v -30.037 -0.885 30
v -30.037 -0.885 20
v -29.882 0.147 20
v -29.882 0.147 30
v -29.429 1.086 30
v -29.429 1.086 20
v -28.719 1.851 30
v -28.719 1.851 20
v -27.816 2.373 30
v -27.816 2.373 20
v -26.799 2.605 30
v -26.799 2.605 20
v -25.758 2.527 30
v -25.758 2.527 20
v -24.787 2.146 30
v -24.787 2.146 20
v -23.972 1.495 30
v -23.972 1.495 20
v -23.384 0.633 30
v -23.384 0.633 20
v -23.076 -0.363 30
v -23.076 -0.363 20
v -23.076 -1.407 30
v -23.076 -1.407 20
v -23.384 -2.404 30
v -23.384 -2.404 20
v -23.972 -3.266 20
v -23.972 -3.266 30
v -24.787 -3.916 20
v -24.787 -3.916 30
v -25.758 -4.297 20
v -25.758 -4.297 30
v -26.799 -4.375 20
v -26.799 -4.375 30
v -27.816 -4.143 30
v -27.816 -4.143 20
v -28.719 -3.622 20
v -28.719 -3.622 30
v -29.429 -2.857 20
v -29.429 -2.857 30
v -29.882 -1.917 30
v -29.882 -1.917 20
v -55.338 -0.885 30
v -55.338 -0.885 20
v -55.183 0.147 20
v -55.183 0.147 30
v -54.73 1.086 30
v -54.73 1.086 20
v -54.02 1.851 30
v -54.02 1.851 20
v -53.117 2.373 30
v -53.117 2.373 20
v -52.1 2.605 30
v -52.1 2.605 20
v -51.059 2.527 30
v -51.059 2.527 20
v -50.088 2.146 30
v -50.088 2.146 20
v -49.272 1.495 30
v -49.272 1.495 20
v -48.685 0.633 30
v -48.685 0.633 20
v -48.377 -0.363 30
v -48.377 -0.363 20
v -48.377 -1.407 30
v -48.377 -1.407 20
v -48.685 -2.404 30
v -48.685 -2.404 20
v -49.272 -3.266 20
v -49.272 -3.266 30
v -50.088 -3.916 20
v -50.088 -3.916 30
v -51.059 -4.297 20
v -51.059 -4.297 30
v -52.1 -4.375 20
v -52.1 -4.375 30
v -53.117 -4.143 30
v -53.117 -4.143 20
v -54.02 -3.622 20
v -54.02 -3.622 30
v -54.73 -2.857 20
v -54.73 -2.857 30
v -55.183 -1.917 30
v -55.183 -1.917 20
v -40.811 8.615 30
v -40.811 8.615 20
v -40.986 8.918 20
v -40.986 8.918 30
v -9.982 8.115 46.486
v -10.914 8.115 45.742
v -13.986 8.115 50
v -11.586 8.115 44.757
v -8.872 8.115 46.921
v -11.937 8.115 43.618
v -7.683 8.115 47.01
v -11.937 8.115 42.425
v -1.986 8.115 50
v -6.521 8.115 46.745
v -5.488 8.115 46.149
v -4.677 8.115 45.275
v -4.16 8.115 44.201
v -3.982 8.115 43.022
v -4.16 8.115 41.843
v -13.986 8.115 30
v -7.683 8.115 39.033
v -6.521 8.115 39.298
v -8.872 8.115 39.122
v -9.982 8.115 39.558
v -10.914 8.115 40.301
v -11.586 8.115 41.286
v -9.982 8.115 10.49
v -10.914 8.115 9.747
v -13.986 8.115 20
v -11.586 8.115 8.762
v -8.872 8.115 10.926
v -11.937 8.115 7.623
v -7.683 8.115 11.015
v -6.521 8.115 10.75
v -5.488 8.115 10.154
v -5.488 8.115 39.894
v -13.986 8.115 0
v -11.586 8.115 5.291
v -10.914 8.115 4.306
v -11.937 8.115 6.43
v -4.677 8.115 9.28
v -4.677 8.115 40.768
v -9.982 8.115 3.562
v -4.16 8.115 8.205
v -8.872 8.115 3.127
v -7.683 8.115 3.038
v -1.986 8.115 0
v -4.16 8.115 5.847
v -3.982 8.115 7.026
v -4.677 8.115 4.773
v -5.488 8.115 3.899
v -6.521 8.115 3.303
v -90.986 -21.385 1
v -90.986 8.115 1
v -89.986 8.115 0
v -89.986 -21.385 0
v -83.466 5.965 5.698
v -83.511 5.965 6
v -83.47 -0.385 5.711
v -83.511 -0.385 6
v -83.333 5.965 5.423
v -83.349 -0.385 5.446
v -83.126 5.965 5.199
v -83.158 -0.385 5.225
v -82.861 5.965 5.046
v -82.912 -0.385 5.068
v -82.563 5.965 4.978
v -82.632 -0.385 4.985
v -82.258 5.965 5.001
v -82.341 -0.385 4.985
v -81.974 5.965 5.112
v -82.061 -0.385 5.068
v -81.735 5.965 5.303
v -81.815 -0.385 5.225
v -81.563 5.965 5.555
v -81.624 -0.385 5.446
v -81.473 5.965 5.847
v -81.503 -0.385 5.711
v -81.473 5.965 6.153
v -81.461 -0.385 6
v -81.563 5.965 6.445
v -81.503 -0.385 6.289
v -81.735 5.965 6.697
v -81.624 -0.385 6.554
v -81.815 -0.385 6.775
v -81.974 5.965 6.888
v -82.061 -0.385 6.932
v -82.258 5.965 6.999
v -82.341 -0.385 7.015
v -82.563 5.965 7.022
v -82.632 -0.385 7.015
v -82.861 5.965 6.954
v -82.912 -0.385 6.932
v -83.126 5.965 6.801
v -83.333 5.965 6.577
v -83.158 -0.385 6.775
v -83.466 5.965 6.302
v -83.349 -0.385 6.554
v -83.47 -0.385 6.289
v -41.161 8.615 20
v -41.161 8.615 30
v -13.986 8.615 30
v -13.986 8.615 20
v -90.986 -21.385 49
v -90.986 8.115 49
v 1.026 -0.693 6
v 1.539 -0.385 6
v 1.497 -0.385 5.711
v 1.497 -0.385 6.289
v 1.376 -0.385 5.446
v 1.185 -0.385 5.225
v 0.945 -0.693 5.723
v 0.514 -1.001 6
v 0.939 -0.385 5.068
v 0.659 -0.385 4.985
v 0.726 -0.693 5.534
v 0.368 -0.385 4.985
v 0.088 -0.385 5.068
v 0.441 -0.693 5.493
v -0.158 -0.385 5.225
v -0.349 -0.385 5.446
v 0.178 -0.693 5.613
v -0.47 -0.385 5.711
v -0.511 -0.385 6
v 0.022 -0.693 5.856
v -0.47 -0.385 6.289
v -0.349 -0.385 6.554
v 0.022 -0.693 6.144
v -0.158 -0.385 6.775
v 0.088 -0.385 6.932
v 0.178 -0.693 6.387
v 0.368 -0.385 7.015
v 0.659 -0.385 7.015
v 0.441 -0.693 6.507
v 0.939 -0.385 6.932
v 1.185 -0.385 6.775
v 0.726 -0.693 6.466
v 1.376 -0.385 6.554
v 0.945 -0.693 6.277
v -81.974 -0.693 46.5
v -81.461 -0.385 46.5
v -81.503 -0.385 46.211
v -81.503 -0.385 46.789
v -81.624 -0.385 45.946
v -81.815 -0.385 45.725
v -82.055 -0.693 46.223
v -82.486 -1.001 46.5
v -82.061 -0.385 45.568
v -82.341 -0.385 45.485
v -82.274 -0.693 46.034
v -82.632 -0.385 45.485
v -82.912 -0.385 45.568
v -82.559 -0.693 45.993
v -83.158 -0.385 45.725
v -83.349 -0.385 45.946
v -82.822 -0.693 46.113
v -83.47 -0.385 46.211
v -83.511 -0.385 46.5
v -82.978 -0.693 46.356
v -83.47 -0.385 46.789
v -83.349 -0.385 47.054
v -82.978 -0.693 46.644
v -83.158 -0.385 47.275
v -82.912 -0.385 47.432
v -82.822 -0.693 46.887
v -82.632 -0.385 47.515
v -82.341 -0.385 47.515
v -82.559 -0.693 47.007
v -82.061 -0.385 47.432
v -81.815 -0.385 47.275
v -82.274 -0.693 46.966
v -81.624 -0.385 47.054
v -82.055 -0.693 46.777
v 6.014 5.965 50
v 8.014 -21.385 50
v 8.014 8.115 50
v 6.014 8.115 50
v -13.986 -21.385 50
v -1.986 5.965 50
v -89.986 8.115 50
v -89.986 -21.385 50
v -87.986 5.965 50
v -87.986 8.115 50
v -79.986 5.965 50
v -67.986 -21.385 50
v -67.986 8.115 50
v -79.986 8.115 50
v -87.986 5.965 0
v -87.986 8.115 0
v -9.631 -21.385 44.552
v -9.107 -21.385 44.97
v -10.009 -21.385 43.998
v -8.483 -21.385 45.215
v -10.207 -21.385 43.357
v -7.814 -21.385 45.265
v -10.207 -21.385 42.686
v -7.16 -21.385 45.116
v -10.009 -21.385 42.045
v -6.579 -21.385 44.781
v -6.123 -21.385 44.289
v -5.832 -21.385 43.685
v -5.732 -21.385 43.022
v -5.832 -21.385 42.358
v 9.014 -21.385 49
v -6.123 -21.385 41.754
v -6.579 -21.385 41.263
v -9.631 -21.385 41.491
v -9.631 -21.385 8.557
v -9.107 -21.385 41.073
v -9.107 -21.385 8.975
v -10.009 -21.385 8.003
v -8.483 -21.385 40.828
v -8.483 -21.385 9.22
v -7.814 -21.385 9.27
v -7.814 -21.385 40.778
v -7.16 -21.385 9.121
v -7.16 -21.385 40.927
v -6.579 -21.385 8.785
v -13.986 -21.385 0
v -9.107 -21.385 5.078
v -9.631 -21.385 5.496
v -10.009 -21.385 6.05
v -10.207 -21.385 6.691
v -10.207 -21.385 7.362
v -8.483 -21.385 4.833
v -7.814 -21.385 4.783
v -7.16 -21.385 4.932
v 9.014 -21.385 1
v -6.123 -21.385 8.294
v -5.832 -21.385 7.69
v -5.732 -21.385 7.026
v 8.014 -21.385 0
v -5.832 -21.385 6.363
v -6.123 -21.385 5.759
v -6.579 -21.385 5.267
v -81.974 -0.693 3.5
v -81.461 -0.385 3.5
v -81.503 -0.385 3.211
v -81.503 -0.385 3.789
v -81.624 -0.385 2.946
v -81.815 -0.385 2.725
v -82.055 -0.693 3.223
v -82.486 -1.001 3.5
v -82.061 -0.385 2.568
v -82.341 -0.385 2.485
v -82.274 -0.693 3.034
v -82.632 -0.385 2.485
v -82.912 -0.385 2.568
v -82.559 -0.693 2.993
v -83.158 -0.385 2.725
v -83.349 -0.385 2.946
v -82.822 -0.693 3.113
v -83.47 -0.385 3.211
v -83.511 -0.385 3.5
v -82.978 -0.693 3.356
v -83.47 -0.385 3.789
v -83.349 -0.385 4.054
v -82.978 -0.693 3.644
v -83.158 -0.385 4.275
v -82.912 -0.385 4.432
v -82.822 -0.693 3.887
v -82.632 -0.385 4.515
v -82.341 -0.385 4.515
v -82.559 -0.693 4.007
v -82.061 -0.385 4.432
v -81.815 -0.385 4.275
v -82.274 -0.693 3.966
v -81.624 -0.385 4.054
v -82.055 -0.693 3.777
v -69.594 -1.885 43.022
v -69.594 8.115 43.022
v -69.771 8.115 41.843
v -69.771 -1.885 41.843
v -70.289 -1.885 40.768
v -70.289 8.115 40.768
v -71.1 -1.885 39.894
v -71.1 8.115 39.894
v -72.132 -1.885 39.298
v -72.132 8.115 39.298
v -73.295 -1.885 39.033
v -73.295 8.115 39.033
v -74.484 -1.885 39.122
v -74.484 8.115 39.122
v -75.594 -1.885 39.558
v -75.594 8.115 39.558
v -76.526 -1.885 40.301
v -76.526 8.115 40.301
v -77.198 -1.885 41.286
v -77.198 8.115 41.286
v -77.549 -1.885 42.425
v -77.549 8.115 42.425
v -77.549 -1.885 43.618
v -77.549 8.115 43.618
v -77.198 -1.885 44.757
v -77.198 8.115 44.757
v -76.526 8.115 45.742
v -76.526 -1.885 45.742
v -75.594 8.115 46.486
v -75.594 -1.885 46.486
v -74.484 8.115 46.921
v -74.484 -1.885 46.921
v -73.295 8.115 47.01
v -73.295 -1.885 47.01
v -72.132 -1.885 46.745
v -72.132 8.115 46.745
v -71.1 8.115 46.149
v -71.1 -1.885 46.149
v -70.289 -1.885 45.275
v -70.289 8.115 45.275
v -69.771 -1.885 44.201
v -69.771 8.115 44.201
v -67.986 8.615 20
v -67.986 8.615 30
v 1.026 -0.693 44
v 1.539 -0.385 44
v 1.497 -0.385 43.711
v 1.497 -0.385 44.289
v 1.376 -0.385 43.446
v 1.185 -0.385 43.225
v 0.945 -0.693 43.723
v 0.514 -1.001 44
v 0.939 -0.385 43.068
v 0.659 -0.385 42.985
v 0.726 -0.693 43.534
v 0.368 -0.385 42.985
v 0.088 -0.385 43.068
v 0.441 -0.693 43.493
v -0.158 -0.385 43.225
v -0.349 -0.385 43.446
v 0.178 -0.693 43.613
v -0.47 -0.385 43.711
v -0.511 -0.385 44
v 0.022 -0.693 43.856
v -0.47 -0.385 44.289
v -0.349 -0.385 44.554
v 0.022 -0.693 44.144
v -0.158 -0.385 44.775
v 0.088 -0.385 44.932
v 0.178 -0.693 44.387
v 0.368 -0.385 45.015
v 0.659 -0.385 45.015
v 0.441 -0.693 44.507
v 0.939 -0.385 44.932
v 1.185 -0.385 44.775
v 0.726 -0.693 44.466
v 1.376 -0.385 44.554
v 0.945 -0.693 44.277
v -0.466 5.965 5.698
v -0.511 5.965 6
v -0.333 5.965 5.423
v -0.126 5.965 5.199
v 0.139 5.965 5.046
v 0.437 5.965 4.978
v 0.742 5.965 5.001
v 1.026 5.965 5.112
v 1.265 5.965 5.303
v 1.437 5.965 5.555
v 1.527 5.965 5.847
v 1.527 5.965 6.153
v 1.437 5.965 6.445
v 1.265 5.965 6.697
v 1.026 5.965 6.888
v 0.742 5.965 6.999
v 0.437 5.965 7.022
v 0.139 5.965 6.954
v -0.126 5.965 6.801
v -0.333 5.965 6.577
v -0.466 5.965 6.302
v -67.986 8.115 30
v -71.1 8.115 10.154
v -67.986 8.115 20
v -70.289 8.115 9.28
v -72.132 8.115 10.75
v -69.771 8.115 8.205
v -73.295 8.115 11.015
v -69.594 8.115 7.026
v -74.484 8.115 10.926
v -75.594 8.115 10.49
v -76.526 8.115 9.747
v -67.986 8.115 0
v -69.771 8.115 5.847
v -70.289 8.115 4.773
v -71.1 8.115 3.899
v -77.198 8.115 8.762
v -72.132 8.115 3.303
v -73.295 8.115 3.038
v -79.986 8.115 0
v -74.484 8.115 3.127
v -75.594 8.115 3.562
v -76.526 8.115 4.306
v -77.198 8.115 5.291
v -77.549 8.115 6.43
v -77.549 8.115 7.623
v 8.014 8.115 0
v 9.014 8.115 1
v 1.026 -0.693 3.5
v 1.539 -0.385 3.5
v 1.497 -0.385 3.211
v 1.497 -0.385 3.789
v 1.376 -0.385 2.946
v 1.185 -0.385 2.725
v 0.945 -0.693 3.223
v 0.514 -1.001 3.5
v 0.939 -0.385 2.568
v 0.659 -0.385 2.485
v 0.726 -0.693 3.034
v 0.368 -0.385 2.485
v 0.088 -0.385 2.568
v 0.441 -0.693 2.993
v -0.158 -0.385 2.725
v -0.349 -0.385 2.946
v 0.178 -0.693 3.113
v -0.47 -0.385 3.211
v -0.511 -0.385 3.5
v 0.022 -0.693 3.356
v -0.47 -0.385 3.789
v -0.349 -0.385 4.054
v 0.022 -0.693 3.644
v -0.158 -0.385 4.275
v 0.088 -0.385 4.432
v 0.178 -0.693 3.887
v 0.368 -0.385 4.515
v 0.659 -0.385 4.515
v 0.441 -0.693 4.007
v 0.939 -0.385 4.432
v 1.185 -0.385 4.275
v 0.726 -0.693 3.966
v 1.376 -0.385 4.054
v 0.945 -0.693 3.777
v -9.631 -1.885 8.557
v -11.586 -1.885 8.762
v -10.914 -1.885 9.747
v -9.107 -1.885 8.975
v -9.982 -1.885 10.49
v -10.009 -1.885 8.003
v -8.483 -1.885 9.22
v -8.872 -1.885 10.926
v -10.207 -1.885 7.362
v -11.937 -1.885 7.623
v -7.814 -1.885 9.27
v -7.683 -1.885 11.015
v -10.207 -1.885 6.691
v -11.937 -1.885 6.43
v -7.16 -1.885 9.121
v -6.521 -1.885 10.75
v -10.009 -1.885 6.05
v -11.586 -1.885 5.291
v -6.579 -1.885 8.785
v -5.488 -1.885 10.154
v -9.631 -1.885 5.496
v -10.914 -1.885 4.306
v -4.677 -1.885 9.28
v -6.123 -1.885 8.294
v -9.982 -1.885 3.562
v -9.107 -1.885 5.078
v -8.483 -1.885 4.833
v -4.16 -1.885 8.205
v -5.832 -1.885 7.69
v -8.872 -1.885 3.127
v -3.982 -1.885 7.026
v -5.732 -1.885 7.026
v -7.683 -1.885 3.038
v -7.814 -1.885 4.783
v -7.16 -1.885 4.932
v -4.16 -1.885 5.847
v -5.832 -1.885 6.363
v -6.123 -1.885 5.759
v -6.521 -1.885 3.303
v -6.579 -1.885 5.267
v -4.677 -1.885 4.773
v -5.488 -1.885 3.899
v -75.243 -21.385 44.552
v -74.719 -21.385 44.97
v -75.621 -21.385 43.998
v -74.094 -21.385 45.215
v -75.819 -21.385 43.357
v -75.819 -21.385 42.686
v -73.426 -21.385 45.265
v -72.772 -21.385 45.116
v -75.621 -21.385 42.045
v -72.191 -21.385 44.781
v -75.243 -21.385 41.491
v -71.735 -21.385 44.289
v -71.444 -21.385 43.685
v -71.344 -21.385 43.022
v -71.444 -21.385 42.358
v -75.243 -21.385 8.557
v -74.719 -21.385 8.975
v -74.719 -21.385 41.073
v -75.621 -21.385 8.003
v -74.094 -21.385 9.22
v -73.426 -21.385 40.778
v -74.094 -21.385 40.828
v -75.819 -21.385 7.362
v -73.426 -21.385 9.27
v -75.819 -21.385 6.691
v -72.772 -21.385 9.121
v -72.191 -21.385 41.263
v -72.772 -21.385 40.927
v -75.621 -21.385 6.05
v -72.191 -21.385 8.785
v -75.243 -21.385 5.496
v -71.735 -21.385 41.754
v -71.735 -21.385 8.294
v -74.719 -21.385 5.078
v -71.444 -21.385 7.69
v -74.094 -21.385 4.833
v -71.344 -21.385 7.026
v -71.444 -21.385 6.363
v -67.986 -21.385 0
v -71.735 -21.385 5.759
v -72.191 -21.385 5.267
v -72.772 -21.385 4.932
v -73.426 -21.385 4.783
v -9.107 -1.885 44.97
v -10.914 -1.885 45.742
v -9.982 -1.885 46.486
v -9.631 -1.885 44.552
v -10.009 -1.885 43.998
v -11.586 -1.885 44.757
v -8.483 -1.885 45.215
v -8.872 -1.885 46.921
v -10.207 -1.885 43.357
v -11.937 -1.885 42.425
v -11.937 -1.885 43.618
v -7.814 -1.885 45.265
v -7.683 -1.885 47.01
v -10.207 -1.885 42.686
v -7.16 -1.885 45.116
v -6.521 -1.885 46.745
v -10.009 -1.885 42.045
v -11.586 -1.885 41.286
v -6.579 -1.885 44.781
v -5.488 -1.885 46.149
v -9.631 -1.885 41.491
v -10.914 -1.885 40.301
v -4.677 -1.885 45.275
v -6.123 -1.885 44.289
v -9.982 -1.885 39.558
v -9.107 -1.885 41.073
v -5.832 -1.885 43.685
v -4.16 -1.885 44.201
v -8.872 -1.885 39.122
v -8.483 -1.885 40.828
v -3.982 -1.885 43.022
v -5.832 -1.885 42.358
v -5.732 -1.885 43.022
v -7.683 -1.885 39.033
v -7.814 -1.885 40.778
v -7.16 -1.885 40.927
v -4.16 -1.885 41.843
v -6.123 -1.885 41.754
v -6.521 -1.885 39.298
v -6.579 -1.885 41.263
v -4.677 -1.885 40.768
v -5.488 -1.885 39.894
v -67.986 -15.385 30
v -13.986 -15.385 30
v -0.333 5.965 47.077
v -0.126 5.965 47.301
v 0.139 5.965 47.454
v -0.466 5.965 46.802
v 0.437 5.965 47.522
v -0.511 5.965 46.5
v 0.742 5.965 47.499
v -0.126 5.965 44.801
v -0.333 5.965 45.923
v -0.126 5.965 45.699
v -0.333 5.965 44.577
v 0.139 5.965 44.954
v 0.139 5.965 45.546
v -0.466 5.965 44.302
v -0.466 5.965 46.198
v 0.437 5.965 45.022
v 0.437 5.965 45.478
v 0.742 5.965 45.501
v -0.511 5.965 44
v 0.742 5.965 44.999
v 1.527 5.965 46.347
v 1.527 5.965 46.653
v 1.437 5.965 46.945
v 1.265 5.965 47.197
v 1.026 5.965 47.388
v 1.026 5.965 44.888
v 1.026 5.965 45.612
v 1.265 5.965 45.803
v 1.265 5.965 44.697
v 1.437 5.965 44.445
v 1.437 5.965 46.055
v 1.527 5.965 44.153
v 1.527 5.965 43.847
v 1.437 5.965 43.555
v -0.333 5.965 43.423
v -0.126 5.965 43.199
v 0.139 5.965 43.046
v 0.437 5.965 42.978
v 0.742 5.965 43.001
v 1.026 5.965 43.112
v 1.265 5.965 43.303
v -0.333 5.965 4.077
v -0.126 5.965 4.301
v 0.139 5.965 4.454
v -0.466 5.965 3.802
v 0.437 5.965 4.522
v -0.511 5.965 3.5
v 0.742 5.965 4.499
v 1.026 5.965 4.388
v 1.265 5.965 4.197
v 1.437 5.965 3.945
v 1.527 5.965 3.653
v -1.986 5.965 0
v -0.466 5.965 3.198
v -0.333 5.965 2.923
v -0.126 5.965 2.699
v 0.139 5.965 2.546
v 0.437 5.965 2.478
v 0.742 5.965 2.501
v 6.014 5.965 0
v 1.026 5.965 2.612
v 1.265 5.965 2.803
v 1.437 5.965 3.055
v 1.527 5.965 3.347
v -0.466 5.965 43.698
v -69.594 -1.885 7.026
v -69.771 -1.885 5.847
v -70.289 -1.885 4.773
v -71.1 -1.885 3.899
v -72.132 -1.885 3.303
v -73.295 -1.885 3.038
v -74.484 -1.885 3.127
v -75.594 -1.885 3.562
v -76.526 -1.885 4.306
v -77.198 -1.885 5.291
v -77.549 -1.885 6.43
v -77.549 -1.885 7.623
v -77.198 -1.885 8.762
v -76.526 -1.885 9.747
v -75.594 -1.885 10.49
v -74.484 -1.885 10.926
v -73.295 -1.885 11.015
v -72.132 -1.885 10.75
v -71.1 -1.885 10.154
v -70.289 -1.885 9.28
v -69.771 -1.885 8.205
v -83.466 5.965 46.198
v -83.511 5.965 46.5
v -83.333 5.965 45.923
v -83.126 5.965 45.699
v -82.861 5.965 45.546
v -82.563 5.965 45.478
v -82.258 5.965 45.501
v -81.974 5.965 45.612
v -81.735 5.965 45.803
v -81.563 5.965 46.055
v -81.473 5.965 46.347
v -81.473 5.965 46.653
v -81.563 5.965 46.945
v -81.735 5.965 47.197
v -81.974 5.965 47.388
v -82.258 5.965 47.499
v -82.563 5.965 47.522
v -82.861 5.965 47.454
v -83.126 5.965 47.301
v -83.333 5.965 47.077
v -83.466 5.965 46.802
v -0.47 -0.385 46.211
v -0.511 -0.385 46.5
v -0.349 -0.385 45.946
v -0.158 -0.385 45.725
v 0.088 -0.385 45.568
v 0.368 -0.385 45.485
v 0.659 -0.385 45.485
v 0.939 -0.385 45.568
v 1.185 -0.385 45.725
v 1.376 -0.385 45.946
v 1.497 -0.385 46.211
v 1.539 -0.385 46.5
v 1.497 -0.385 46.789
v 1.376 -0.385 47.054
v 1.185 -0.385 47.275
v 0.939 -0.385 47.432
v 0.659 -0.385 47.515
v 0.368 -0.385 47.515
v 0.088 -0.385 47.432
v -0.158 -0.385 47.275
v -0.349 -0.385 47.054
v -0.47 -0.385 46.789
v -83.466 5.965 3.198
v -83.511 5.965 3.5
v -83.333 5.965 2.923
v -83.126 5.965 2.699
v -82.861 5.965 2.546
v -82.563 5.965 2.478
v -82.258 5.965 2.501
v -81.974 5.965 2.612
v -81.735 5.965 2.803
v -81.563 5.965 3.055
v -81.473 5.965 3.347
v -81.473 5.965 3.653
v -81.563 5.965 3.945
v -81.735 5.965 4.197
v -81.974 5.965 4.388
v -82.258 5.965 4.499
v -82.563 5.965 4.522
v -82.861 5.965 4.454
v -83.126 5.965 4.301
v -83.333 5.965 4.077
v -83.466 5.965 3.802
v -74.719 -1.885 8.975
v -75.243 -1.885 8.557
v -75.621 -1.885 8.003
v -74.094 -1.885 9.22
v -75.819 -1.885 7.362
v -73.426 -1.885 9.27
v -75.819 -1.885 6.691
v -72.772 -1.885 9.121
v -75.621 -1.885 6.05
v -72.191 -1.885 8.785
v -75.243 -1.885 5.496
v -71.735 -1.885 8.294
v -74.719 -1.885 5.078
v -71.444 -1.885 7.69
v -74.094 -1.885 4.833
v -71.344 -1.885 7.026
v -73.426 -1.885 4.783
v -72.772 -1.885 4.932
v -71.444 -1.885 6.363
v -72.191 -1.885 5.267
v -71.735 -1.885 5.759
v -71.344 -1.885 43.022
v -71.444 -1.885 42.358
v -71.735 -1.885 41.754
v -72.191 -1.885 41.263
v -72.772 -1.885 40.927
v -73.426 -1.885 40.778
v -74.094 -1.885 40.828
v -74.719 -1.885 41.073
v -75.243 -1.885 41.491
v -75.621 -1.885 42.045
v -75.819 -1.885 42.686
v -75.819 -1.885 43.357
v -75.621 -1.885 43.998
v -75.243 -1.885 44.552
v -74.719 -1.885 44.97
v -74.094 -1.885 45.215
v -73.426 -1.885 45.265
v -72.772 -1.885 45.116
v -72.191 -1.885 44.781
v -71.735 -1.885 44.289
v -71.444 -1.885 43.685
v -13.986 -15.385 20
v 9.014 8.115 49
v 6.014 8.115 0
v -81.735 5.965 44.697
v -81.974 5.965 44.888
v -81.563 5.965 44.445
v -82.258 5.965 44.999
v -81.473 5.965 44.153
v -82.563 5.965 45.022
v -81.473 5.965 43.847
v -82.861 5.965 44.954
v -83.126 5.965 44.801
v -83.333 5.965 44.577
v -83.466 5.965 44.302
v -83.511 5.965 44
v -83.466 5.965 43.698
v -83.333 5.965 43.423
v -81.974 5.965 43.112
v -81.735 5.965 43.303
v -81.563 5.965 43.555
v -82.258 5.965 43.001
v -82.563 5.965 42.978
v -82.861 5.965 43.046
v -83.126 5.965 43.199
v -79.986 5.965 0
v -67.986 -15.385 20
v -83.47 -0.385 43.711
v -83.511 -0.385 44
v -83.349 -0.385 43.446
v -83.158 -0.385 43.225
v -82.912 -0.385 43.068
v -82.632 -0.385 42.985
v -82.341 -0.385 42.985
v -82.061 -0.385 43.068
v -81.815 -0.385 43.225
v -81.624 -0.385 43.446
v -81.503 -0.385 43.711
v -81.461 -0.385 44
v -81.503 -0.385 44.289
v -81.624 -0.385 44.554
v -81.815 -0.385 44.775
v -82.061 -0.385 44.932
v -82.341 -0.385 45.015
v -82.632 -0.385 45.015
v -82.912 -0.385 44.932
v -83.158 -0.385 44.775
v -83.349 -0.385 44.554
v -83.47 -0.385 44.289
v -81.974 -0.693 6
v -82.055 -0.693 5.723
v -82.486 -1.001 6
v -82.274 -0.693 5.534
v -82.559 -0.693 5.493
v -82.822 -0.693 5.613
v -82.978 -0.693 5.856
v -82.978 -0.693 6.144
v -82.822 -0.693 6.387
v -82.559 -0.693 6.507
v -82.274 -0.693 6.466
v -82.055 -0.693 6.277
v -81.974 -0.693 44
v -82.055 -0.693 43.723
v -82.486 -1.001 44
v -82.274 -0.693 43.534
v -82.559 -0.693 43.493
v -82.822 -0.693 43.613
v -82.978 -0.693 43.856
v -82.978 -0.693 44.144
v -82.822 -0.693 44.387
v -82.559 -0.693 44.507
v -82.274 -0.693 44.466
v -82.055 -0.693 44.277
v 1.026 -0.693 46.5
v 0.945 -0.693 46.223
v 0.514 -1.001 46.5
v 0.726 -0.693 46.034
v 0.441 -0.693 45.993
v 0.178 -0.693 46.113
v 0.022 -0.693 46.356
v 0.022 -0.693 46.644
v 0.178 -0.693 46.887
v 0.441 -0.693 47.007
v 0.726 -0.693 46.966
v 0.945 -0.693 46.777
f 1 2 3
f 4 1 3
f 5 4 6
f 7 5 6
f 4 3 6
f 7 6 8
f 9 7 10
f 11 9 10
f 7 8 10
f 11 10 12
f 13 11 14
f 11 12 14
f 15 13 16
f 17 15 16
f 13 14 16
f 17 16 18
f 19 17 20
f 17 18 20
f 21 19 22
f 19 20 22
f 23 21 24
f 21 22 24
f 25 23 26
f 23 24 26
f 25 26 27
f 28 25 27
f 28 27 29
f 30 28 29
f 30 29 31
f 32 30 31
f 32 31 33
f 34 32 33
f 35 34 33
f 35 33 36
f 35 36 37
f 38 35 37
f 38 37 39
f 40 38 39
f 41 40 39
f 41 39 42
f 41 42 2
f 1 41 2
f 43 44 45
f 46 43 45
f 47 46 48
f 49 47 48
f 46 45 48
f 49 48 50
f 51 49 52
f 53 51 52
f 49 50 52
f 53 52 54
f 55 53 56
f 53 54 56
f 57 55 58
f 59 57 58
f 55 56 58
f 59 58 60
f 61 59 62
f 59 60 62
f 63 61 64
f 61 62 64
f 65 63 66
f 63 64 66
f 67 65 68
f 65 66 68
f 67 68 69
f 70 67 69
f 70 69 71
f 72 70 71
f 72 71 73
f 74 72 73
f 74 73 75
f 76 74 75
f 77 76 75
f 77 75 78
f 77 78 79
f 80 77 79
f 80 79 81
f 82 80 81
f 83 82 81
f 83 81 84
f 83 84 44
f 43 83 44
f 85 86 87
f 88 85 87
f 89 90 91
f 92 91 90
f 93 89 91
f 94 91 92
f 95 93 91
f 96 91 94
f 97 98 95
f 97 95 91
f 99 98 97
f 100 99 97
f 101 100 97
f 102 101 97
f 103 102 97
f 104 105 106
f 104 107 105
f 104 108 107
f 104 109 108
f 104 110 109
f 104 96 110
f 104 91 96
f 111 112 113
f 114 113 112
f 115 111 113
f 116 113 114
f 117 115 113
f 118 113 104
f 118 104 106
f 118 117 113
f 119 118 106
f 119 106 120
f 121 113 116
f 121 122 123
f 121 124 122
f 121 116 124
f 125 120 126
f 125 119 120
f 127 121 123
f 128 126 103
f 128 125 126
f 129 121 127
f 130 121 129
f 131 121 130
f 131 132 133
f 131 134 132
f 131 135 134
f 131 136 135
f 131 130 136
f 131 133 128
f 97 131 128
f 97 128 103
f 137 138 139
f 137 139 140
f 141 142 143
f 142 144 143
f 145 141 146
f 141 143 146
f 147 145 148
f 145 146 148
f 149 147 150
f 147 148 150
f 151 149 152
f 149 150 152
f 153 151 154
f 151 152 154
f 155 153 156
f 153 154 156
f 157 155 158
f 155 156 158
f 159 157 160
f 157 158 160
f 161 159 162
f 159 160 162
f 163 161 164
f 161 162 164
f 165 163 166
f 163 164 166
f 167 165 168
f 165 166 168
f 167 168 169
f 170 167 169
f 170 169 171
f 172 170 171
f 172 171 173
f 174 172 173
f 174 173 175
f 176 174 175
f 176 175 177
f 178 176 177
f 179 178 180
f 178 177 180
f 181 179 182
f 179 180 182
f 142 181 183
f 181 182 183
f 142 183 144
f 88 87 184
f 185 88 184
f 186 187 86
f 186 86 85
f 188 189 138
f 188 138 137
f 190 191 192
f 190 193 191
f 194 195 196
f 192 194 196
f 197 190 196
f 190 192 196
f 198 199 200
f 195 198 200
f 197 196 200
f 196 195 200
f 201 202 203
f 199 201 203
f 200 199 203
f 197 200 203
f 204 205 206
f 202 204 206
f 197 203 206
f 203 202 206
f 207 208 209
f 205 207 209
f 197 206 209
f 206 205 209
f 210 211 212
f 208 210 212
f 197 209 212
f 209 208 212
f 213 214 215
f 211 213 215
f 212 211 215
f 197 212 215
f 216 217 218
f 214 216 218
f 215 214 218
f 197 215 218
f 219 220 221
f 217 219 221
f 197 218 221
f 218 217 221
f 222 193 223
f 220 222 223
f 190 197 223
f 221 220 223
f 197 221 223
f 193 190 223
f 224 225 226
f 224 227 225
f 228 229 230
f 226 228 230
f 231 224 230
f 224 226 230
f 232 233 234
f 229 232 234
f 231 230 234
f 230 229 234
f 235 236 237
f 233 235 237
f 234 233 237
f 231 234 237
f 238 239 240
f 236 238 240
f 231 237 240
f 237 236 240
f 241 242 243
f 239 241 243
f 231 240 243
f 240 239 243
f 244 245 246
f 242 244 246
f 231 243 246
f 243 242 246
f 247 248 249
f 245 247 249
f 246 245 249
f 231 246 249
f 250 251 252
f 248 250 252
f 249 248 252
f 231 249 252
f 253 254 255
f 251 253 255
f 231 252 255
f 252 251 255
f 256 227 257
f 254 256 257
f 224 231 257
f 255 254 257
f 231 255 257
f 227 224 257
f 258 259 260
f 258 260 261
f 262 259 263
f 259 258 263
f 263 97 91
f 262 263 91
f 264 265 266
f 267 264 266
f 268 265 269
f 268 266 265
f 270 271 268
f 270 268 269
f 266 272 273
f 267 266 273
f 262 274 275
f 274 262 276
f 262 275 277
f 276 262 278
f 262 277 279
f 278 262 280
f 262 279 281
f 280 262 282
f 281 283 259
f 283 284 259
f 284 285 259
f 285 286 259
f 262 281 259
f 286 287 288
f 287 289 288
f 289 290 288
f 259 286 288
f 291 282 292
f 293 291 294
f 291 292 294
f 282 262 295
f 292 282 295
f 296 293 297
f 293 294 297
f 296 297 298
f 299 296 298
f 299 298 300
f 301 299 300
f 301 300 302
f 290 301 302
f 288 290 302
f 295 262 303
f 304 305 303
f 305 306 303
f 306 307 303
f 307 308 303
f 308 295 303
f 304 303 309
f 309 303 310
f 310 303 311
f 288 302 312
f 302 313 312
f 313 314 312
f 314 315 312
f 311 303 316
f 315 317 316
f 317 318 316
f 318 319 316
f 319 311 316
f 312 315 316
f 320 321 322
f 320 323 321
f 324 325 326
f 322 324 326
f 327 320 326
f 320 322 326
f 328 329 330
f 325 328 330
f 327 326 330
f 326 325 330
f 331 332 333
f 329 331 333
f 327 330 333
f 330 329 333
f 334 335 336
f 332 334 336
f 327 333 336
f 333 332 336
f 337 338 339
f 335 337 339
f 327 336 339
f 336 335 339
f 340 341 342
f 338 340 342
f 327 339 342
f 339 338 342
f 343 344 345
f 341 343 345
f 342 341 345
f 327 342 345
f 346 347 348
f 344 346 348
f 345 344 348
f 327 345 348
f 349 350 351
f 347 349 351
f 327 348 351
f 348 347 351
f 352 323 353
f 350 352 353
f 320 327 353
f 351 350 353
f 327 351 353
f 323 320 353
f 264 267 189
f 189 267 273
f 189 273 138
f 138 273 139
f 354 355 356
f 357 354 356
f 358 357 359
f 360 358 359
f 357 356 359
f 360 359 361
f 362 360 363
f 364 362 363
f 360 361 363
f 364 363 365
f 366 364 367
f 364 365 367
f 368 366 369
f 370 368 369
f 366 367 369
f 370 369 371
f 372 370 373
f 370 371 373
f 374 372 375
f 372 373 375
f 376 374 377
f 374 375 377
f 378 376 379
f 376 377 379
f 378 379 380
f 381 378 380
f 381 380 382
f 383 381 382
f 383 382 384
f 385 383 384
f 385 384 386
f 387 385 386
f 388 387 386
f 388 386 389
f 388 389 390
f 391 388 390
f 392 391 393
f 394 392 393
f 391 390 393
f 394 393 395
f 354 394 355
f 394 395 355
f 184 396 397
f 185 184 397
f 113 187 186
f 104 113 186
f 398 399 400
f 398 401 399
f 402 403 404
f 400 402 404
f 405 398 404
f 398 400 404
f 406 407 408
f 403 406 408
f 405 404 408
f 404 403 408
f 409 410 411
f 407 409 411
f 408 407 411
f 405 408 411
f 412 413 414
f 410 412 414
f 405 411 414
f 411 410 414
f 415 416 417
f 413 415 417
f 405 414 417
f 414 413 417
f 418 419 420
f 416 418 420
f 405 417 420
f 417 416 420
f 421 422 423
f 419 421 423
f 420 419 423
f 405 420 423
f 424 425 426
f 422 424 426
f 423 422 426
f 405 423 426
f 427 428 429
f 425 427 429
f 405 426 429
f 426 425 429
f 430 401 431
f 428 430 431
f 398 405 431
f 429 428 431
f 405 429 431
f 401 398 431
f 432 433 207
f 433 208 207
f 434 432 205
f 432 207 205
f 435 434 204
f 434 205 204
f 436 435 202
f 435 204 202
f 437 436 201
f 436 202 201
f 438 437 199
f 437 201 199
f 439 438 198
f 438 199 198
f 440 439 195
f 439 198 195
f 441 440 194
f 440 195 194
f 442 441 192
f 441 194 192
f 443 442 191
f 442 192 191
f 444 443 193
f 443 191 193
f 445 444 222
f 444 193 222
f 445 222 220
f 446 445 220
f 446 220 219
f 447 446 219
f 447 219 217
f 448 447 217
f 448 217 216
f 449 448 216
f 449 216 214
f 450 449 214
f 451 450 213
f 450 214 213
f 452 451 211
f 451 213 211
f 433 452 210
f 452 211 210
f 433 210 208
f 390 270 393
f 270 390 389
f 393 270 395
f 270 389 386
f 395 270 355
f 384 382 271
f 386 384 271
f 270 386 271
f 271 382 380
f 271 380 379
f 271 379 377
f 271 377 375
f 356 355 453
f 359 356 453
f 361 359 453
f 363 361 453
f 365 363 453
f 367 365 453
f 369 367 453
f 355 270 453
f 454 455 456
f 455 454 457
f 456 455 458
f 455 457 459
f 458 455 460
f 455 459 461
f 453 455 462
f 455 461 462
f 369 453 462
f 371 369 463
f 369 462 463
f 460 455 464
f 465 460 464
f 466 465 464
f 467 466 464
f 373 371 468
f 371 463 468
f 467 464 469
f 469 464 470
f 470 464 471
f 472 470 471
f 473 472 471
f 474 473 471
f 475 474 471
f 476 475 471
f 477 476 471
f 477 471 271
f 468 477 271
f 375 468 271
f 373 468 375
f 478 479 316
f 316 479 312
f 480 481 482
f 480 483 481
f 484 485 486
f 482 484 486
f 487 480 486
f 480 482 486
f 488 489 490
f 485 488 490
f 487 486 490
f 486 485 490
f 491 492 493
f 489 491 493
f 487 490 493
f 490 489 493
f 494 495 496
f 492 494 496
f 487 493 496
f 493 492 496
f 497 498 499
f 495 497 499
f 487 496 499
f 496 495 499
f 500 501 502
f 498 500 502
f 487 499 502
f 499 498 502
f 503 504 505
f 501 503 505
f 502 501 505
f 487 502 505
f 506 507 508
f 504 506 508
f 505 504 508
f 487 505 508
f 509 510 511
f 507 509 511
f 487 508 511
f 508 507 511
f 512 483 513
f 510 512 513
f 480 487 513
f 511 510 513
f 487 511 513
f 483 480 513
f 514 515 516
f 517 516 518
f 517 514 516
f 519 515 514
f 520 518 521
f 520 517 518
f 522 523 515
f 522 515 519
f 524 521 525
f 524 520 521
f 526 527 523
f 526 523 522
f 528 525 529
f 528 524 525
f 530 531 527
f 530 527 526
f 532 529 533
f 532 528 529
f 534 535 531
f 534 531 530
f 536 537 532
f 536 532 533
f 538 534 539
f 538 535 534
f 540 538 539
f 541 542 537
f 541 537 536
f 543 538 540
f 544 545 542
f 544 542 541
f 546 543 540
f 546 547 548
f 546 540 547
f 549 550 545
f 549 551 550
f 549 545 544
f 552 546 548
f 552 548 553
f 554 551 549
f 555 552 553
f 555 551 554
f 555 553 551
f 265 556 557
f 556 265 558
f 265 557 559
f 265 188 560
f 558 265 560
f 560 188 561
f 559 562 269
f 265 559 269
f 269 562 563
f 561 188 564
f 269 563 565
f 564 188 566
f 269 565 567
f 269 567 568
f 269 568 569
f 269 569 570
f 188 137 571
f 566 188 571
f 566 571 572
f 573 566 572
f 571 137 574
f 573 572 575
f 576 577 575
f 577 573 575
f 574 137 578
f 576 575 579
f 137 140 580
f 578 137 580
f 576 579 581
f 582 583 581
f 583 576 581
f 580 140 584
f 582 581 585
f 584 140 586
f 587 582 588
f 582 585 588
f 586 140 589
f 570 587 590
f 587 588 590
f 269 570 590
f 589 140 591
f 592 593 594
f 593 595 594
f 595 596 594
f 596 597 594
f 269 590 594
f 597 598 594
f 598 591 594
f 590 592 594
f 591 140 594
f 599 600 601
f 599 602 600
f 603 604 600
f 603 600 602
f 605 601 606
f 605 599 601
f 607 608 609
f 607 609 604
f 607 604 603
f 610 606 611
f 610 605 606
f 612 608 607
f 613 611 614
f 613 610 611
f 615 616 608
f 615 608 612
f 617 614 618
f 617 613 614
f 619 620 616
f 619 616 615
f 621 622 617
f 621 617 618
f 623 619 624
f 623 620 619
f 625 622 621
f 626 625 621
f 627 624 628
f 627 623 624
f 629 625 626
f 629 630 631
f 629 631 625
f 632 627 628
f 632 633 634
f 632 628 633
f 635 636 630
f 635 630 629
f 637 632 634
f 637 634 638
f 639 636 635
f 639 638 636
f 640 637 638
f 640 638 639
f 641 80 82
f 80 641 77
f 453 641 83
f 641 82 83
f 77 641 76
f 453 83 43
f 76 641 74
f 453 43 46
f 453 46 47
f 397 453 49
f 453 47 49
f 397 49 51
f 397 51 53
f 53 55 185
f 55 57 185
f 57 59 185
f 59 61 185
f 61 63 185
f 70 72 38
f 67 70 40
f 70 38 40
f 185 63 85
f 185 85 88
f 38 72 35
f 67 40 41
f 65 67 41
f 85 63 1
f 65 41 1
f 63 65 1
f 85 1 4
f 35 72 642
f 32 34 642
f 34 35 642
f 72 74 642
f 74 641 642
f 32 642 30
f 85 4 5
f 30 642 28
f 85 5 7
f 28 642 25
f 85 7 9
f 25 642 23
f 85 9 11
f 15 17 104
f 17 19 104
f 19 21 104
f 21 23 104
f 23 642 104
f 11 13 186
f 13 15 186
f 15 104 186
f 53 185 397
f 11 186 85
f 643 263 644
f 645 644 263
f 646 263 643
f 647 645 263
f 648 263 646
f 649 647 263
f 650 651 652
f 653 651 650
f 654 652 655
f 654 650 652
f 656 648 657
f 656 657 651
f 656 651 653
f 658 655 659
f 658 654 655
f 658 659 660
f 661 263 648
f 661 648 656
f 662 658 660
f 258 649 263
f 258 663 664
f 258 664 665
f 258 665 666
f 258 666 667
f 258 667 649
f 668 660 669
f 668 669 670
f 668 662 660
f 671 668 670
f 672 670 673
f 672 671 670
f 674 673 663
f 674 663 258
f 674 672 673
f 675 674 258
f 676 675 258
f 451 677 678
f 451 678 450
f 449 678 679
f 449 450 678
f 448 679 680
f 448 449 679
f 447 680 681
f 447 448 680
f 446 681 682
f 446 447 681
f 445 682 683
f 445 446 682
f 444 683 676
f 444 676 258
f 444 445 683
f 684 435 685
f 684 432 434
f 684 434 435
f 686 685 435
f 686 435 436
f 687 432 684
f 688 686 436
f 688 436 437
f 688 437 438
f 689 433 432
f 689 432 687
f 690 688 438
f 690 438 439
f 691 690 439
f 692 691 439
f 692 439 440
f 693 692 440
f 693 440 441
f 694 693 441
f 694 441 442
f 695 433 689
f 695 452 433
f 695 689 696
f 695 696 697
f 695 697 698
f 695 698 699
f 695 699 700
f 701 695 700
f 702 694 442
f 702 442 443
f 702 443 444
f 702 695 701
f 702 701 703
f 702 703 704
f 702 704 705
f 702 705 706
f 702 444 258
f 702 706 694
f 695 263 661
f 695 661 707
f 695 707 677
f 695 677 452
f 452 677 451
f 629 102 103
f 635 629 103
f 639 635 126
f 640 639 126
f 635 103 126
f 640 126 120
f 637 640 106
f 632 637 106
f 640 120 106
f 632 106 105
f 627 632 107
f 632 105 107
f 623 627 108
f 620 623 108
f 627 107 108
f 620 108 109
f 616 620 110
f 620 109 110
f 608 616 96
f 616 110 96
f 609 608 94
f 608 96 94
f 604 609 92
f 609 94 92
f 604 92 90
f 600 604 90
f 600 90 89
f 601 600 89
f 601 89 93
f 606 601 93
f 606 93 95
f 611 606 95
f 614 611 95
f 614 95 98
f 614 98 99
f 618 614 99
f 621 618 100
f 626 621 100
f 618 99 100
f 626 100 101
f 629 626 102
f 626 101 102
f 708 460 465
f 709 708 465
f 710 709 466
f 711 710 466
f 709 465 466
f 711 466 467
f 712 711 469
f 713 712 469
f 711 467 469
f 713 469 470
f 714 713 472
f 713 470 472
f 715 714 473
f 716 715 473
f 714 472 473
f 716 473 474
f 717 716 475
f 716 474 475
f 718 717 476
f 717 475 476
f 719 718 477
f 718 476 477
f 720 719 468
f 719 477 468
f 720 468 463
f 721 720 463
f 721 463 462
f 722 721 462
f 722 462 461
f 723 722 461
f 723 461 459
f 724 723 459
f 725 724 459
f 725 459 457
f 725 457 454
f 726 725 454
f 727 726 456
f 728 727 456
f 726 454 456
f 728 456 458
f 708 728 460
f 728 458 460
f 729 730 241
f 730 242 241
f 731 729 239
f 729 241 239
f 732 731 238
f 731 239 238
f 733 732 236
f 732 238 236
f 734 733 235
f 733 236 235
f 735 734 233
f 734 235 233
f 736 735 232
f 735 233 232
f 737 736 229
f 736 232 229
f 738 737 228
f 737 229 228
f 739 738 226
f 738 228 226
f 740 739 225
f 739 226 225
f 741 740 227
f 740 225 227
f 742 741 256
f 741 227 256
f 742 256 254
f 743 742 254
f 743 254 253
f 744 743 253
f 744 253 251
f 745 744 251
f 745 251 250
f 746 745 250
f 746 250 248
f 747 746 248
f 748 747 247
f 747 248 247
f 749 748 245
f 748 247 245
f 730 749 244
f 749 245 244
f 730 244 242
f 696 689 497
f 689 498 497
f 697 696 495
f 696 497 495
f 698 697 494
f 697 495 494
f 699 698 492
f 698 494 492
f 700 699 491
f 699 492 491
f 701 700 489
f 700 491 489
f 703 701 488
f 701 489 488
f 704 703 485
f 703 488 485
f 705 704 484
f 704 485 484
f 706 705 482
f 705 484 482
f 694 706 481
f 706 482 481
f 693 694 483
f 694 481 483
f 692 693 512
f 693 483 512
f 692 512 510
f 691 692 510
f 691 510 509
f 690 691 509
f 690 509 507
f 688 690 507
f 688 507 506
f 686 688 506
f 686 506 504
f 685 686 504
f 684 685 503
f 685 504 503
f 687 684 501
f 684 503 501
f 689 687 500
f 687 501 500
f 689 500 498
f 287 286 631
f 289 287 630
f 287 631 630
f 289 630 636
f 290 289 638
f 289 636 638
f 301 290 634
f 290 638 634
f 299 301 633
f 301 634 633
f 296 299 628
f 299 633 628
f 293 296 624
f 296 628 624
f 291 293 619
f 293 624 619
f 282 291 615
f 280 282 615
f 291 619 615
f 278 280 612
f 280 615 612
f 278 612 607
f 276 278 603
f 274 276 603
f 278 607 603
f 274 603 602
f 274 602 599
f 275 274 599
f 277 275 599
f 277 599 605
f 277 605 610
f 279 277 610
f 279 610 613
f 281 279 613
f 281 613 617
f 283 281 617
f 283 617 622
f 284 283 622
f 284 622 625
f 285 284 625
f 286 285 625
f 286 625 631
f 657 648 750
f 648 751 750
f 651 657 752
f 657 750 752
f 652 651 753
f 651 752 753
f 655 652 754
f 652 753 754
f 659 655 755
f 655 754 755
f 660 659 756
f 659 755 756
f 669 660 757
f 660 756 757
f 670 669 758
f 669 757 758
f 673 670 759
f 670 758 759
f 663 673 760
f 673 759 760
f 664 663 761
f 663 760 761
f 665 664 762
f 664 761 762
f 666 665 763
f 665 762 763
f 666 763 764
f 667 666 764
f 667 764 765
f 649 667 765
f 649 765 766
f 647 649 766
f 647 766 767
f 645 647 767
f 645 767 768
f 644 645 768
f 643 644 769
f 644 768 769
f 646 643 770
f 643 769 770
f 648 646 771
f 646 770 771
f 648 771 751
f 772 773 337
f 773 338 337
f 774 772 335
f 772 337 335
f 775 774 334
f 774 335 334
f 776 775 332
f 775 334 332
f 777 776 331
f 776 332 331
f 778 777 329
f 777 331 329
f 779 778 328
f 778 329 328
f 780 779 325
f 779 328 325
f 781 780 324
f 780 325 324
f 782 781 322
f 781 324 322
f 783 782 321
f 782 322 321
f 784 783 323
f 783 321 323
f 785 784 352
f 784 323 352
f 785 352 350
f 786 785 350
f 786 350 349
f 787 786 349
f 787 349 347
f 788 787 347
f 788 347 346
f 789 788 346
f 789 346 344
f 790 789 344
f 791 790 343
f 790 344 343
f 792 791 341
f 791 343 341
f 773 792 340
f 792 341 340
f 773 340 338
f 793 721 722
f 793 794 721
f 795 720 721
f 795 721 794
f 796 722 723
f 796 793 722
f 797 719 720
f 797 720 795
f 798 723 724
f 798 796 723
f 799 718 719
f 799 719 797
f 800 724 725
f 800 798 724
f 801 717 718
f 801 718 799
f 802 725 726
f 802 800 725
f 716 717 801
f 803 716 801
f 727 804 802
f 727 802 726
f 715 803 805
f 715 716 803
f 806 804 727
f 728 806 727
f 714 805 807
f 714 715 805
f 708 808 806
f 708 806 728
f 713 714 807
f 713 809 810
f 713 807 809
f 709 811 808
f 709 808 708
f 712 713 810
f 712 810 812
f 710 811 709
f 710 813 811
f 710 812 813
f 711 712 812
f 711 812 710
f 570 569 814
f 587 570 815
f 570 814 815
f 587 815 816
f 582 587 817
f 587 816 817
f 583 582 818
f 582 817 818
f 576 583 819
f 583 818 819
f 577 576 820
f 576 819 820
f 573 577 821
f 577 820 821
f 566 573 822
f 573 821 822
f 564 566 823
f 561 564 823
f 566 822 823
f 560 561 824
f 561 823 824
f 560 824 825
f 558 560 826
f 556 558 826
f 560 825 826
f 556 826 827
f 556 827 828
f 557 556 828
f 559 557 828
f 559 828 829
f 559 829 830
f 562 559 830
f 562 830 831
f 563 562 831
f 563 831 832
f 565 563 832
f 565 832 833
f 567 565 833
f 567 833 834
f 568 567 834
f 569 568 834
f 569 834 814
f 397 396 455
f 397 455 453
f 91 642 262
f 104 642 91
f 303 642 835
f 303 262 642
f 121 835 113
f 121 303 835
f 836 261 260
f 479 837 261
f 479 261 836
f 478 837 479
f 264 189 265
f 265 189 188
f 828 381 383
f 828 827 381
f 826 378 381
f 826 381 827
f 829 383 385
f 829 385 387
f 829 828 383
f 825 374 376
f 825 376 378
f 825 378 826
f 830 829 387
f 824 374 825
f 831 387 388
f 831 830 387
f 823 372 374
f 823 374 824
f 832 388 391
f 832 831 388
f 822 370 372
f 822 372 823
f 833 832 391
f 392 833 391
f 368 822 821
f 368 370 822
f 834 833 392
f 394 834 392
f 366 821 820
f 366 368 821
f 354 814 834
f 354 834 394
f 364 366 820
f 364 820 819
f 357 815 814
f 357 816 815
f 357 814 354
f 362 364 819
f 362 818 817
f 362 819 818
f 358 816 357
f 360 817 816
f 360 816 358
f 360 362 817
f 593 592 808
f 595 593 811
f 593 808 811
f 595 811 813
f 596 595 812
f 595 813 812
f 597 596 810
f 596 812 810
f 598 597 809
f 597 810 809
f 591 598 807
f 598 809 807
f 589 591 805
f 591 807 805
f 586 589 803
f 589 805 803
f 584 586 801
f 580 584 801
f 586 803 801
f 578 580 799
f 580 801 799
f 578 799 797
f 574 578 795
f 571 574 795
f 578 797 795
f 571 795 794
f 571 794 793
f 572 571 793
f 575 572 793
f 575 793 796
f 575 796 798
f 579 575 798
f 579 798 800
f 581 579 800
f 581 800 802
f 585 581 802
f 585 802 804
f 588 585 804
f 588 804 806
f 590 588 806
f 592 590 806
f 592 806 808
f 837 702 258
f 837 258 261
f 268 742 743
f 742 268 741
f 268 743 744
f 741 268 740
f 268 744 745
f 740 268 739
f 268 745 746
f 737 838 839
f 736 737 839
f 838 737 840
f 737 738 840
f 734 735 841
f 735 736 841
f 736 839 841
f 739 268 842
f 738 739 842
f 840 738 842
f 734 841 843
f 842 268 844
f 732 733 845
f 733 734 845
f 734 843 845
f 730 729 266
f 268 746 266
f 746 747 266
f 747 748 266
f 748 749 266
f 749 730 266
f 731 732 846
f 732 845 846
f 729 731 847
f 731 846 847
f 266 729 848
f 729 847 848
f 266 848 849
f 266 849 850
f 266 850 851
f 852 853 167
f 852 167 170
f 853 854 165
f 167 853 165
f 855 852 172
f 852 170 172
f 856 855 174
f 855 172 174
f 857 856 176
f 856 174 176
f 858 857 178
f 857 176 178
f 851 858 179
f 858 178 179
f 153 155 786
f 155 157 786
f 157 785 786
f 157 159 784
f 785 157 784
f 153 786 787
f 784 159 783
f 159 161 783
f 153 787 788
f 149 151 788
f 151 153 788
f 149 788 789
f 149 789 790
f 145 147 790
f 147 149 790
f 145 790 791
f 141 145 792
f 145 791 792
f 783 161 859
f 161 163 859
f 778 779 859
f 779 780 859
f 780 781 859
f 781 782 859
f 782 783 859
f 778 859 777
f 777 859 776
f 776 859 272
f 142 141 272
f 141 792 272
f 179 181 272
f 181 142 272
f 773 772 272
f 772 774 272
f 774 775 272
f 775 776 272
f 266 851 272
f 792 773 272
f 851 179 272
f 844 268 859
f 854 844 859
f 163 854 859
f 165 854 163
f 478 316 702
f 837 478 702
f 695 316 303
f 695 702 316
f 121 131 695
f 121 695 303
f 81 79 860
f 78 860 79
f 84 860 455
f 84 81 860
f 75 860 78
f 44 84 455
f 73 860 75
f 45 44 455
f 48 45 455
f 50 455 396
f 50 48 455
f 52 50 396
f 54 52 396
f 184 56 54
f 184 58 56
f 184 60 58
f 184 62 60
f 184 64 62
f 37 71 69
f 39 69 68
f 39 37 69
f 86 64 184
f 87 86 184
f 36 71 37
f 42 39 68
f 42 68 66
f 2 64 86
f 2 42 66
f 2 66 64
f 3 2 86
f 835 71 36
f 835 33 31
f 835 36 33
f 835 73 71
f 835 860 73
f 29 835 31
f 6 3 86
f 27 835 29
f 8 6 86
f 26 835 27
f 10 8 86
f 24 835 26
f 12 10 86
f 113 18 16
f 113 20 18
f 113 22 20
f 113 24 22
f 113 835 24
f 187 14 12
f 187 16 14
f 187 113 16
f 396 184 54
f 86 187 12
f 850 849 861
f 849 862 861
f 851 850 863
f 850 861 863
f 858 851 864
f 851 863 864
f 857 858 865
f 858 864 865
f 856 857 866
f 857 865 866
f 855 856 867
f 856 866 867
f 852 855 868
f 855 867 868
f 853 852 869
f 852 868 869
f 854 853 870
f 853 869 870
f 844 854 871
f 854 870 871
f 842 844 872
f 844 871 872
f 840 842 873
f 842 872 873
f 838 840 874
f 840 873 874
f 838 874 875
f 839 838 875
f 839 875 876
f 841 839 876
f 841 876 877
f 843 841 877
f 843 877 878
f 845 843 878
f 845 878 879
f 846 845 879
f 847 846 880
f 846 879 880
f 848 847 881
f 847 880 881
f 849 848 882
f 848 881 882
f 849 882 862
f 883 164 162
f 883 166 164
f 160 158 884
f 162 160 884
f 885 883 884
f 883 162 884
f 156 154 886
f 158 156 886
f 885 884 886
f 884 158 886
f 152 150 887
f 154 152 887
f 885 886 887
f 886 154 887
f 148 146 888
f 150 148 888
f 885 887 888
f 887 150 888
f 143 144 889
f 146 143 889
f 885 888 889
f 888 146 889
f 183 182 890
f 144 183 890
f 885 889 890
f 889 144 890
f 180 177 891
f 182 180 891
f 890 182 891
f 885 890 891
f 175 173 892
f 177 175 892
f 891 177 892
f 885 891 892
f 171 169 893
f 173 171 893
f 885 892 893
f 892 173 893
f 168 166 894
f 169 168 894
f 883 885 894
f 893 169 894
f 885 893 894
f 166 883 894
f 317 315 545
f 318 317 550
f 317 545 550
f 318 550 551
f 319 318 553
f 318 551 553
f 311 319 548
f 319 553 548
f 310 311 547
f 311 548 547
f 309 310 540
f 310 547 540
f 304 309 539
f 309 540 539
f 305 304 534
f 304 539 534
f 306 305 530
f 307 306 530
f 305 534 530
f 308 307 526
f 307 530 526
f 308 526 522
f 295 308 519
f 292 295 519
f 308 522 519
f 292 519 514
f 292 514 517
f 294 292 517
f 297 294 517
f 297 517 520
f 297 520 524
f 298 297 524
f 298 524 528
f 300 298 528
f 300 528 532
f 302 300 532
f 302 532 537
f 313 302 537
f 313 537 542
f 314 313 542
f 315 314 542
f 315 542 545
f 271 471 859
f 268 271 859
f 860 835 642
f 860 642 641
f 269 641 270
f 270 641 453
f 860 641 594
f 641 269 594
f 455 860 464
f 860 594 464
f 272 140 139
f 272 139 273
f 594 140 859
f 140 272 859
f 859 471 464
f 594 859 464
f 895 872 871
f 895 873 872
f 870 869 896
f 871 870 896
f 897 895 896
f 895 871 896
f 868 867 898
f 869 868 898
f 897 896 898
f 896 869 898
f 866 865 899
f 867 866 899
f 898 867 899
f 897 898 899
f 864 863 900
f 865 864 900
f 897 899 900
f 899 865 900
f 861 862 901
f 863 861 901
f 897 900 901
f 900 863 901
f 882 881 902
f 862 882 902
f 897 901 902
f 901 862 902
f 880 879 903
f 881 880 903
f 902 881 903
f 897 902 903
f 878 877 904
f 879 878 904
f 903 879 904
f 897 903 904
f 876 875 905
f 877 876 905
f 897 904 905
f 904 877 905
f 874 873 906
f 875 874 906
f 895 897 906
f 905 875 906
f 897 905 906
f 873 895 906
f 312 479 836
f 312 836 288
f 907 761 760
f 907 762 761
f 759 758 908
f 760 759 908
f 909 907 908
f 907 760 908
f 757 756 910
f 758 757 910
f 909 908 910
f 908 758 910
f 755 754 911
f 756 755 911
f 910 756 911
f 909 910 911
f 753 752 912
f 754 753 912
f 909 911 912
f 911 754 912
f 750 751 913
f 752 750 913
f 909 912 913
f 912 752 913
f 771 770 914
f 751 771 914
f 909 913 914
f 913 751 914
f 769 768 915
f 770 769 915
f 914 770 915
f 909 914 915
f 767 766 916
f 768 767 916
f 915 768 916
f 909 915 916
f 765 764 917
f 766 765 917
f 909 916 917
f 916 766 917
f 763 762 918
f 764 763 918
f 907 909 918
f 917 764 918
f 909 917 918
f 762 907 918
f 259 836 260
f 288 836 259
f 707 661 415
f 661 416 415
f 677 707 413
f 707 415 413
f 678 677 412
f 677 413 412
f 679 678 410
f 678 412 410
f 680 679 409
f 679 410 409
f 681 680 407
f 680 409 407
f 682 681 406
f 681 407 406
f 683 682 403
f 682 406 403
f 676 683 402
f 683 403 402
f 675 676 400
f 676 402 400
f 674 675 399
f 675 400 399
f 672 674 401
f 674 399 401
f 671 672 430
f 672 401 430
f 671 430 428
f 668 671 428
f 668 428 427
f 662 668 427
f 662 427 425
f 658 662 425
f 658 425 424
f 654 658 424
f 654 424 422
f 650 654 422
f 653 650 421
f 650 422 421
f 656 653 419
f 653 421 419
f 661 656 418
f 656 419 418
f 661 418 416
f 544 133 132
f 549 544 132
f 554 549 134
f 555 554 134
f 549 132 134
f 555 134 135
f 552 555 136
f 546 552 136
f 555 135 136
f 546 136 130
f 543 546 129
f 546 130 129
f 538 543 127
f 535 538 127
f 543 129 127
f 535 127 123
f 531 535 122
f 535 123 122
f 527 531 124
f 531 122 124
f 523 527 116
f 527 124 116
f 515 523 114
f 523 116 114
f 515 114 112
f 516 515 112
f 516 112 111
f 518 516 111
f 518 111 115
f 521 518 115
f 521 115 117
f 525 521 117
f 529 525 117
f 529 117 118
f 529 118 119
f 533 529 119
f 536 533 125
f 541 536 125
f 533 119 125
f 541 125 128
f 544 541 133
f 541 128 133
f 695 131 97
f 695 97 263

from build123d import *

# Parameters (mm, degrees)
BOSS_EXTRUDE1_DEPTH     = 50
SKETCH2_W               = 10
SKETCH2_H               = 30
BOSS_EXTRUDE2_DEPTH     = 54
BOSS_EXTRUDE4_DEPTH     = 10
BOSS_EXTRUDE5_DEPTH     = 50
SKETCH5_R               = 3.5
CUT_EXTRUDE1_DEPTH      = 54
SKETCH6_R               = 2.25
CUT_EXTRUDE2_DEPTH      = 30.5
SKETCH7_R               = 4
CUT_EXTRUDE3_DEPTH      = 10
M2_5_TAPPED_HOLE2_D     = 2.05
M2_5_TAPPED_HOLE2_DEPTH = 6.35
M2_5_TAPPED_HOLE2_TIP   = 0.615882135
CHAMFER1_SIZE           = 1
SKETCH14_W              = 54
SKETCH14_H              = 6
CUT_EXTRUDE4_DEPTH      = 10


with BuildPart() as part:
    # Sketch1 → Boss-Extrude1 (new body)
    with BuildSketch(Plane.XY):
        Polygon((6.013513514, 8.114864865), (9.013513514, 8.114864865), (9.013513514, -21.385135135), (-13.986486486, -21.385135135), (-13.986486486, 8.114864865), (-1.986486486, 8.114864865), (-1.986486486, 5.964864865), (6.013513514, 5.964864865), align=None)
    extrude(amount=BOSS_EXTRUDE1_DEPTH)

    # Sketch2 → Boss-Extrude2 (add)
    with BuildSketch(Plane.ZY.offset(13.986486486)):
        with Locations((25, -6.385135135)):
            Rectangle(SKETCH2_W, SKETCH2_H)
    extrude(amount=BOSS_EXTRUDE2_DEPTH)

    # Sketch3 → Boss-Extrude4 (add)
    with BuildSketch(Plane(origin=(0, 0, 20), x_dir=(-1, 0, 0), z_dir=(0, 0, -1))):
        Polygon((40.811486486, 8.614864865), (40.986486486, 8.917973756), (41.161486486, 8.614864865), align=None)
    extrude(amount=-BOSS_EXTRUDE4_DEPTH)

    # Sketch4 → Boss-Extrude5 (add)
    with BuildSketch(Plane(origin=(0, 0, 0), x_dir=(-1, 0, 0), z_dir=(0, 0, -1))):
        Polygon((67.986486486, 8.114864865), (79.986486486, 8.114864865), (79.986486486, 5.964864865), (87.986486486, 5.964864865), (87.986486486, 8.114864865), (90.986486486, 8.114864865), (90.986486486, -21.385135135), (67.986486486, -21.385135135), align=None)
    extrude(amount=-BOSS_EXTRUDE5_DEPTH)

    # Sketch5 → Cut-Extrude1 (cut)
    with BuildSketch(Plane(origin=(0, 0, 20), x_dir=(-1, 0, 0), z_dir=(0, 0, -1))):
        with Locations((26.537216594, -0.885135135)):
            Circle(SKETCH5_R)
        with Locations((51.838124653, -0.885135135)):
            Circle(SKETCH5_R)
    extrude(amount=-CUT_EXTRUDE1_DEPTH, mode=Mode.SUBTRACT)

    # Sketch6 → Cut-Extrude2 (cut, through all)
    with BuildSketch(Plane(origin=(0, 8.114864865, 0), x_dir=(1, 0, 0), z_dir=(0, 1, 0))):
        with Locations((-7.981926448, -7.026366578)):
            Circle(SKETCH6_R)
        with Locations((-7.981926448, -43.021631087)):
            Circle(SKETCH6_R)
        with Locations((-73.593710074, -43.021631087)):
            Circle(SKETCH6_R)
        with Locations((-73.593710074, -7.026366578)):
            Circle(SKETCH6_R)
    extrude(amount=-CUT_EXTRUDE2_DEPTH, mode=Mode.SUBTRACT)

    # Sketch7 → Cut-Extrude3 (cut)
    with BuildSketch(Plane(origin=(0, 8.114864865, 0), x_dir=(1, 0, 0), z_dir=(0, 1, 0))):
        with Locations((-7.981926448, -43.021631087)):
            Circle(SKETCH7_R)
        with Locations((-7.981926448, -7.026366578)):
            Circle(SKETCH7_R)
        with Locations((-73.593710074, -43.021631087)):
            Circle(SKETCH7_R)
        with Locations((-73.593710074, -7.026366578)):
            Circle(SKETCH7_R)
    extrude(amount=-CUT_EXTRUDE3_DEPTH, mode=Mode.SUBTRACT)

    # M2.5 Tapped Hole2
    with Locations(Plane(origin=(0, 5.964864865, 0), x_dir=(1, 0, 0), z_dir=(0, 1, 0))):
        with Locations((0.513513514, -46.5), (0.513513514, -3.5), (-82.486486486, -46.5), (-82.486486486, -3.5), (0.513513514, -44), (0.513513514, -6), (-82.486486486, -44), (-82.486486486, -6)):
            Hole(M2_5_TAPPED_HOLE2_D / 2, depth=M2_5_TAPPED_HOLE2_DEPTH)
            with Locations((0, 0, -(M2_5_TAPPED_HOLE2_DEPTH + M2_5_TAPPED_HOLE2_TIP / 2))):  # 118° drill point
                Cone(0, M2_5_TAPPED_HOLE2_D / 2, M2_5_TAPPED_HOLE2_TIP, mode=Mode.SUBTRACT)

    # Chamfer1
    chamfer1_edges = [part.edges().sort_by_distance(p)[0] for p in [
        (9.013513514, -6.635135135, 50),
        (-90.986486486, -6.635135135, 50),
        (-90.986486486, -6.635135135, 0),
        (9.013513514, -6.635135135, 0),
    ]]
    chamfer(chamfer1_edges, length=CHAMFER1_SIZE)

    # Sketch14 → Cut-Extrude4 (cut)
    with BuildSketch(Plane(origin=(0, 0, 20), x_dir=(-1, 0, 0), z_dir=(0, 0, -1))):
        with Locations((40.986486486, -18.385135135)):
            Rectangle(SKETCH14_W, SKETCH14_H)
    extrude(amount=-CUT_EXTRUDE4_DEPTH, mode=Mode.SUBTRACT)


solid = part.part
